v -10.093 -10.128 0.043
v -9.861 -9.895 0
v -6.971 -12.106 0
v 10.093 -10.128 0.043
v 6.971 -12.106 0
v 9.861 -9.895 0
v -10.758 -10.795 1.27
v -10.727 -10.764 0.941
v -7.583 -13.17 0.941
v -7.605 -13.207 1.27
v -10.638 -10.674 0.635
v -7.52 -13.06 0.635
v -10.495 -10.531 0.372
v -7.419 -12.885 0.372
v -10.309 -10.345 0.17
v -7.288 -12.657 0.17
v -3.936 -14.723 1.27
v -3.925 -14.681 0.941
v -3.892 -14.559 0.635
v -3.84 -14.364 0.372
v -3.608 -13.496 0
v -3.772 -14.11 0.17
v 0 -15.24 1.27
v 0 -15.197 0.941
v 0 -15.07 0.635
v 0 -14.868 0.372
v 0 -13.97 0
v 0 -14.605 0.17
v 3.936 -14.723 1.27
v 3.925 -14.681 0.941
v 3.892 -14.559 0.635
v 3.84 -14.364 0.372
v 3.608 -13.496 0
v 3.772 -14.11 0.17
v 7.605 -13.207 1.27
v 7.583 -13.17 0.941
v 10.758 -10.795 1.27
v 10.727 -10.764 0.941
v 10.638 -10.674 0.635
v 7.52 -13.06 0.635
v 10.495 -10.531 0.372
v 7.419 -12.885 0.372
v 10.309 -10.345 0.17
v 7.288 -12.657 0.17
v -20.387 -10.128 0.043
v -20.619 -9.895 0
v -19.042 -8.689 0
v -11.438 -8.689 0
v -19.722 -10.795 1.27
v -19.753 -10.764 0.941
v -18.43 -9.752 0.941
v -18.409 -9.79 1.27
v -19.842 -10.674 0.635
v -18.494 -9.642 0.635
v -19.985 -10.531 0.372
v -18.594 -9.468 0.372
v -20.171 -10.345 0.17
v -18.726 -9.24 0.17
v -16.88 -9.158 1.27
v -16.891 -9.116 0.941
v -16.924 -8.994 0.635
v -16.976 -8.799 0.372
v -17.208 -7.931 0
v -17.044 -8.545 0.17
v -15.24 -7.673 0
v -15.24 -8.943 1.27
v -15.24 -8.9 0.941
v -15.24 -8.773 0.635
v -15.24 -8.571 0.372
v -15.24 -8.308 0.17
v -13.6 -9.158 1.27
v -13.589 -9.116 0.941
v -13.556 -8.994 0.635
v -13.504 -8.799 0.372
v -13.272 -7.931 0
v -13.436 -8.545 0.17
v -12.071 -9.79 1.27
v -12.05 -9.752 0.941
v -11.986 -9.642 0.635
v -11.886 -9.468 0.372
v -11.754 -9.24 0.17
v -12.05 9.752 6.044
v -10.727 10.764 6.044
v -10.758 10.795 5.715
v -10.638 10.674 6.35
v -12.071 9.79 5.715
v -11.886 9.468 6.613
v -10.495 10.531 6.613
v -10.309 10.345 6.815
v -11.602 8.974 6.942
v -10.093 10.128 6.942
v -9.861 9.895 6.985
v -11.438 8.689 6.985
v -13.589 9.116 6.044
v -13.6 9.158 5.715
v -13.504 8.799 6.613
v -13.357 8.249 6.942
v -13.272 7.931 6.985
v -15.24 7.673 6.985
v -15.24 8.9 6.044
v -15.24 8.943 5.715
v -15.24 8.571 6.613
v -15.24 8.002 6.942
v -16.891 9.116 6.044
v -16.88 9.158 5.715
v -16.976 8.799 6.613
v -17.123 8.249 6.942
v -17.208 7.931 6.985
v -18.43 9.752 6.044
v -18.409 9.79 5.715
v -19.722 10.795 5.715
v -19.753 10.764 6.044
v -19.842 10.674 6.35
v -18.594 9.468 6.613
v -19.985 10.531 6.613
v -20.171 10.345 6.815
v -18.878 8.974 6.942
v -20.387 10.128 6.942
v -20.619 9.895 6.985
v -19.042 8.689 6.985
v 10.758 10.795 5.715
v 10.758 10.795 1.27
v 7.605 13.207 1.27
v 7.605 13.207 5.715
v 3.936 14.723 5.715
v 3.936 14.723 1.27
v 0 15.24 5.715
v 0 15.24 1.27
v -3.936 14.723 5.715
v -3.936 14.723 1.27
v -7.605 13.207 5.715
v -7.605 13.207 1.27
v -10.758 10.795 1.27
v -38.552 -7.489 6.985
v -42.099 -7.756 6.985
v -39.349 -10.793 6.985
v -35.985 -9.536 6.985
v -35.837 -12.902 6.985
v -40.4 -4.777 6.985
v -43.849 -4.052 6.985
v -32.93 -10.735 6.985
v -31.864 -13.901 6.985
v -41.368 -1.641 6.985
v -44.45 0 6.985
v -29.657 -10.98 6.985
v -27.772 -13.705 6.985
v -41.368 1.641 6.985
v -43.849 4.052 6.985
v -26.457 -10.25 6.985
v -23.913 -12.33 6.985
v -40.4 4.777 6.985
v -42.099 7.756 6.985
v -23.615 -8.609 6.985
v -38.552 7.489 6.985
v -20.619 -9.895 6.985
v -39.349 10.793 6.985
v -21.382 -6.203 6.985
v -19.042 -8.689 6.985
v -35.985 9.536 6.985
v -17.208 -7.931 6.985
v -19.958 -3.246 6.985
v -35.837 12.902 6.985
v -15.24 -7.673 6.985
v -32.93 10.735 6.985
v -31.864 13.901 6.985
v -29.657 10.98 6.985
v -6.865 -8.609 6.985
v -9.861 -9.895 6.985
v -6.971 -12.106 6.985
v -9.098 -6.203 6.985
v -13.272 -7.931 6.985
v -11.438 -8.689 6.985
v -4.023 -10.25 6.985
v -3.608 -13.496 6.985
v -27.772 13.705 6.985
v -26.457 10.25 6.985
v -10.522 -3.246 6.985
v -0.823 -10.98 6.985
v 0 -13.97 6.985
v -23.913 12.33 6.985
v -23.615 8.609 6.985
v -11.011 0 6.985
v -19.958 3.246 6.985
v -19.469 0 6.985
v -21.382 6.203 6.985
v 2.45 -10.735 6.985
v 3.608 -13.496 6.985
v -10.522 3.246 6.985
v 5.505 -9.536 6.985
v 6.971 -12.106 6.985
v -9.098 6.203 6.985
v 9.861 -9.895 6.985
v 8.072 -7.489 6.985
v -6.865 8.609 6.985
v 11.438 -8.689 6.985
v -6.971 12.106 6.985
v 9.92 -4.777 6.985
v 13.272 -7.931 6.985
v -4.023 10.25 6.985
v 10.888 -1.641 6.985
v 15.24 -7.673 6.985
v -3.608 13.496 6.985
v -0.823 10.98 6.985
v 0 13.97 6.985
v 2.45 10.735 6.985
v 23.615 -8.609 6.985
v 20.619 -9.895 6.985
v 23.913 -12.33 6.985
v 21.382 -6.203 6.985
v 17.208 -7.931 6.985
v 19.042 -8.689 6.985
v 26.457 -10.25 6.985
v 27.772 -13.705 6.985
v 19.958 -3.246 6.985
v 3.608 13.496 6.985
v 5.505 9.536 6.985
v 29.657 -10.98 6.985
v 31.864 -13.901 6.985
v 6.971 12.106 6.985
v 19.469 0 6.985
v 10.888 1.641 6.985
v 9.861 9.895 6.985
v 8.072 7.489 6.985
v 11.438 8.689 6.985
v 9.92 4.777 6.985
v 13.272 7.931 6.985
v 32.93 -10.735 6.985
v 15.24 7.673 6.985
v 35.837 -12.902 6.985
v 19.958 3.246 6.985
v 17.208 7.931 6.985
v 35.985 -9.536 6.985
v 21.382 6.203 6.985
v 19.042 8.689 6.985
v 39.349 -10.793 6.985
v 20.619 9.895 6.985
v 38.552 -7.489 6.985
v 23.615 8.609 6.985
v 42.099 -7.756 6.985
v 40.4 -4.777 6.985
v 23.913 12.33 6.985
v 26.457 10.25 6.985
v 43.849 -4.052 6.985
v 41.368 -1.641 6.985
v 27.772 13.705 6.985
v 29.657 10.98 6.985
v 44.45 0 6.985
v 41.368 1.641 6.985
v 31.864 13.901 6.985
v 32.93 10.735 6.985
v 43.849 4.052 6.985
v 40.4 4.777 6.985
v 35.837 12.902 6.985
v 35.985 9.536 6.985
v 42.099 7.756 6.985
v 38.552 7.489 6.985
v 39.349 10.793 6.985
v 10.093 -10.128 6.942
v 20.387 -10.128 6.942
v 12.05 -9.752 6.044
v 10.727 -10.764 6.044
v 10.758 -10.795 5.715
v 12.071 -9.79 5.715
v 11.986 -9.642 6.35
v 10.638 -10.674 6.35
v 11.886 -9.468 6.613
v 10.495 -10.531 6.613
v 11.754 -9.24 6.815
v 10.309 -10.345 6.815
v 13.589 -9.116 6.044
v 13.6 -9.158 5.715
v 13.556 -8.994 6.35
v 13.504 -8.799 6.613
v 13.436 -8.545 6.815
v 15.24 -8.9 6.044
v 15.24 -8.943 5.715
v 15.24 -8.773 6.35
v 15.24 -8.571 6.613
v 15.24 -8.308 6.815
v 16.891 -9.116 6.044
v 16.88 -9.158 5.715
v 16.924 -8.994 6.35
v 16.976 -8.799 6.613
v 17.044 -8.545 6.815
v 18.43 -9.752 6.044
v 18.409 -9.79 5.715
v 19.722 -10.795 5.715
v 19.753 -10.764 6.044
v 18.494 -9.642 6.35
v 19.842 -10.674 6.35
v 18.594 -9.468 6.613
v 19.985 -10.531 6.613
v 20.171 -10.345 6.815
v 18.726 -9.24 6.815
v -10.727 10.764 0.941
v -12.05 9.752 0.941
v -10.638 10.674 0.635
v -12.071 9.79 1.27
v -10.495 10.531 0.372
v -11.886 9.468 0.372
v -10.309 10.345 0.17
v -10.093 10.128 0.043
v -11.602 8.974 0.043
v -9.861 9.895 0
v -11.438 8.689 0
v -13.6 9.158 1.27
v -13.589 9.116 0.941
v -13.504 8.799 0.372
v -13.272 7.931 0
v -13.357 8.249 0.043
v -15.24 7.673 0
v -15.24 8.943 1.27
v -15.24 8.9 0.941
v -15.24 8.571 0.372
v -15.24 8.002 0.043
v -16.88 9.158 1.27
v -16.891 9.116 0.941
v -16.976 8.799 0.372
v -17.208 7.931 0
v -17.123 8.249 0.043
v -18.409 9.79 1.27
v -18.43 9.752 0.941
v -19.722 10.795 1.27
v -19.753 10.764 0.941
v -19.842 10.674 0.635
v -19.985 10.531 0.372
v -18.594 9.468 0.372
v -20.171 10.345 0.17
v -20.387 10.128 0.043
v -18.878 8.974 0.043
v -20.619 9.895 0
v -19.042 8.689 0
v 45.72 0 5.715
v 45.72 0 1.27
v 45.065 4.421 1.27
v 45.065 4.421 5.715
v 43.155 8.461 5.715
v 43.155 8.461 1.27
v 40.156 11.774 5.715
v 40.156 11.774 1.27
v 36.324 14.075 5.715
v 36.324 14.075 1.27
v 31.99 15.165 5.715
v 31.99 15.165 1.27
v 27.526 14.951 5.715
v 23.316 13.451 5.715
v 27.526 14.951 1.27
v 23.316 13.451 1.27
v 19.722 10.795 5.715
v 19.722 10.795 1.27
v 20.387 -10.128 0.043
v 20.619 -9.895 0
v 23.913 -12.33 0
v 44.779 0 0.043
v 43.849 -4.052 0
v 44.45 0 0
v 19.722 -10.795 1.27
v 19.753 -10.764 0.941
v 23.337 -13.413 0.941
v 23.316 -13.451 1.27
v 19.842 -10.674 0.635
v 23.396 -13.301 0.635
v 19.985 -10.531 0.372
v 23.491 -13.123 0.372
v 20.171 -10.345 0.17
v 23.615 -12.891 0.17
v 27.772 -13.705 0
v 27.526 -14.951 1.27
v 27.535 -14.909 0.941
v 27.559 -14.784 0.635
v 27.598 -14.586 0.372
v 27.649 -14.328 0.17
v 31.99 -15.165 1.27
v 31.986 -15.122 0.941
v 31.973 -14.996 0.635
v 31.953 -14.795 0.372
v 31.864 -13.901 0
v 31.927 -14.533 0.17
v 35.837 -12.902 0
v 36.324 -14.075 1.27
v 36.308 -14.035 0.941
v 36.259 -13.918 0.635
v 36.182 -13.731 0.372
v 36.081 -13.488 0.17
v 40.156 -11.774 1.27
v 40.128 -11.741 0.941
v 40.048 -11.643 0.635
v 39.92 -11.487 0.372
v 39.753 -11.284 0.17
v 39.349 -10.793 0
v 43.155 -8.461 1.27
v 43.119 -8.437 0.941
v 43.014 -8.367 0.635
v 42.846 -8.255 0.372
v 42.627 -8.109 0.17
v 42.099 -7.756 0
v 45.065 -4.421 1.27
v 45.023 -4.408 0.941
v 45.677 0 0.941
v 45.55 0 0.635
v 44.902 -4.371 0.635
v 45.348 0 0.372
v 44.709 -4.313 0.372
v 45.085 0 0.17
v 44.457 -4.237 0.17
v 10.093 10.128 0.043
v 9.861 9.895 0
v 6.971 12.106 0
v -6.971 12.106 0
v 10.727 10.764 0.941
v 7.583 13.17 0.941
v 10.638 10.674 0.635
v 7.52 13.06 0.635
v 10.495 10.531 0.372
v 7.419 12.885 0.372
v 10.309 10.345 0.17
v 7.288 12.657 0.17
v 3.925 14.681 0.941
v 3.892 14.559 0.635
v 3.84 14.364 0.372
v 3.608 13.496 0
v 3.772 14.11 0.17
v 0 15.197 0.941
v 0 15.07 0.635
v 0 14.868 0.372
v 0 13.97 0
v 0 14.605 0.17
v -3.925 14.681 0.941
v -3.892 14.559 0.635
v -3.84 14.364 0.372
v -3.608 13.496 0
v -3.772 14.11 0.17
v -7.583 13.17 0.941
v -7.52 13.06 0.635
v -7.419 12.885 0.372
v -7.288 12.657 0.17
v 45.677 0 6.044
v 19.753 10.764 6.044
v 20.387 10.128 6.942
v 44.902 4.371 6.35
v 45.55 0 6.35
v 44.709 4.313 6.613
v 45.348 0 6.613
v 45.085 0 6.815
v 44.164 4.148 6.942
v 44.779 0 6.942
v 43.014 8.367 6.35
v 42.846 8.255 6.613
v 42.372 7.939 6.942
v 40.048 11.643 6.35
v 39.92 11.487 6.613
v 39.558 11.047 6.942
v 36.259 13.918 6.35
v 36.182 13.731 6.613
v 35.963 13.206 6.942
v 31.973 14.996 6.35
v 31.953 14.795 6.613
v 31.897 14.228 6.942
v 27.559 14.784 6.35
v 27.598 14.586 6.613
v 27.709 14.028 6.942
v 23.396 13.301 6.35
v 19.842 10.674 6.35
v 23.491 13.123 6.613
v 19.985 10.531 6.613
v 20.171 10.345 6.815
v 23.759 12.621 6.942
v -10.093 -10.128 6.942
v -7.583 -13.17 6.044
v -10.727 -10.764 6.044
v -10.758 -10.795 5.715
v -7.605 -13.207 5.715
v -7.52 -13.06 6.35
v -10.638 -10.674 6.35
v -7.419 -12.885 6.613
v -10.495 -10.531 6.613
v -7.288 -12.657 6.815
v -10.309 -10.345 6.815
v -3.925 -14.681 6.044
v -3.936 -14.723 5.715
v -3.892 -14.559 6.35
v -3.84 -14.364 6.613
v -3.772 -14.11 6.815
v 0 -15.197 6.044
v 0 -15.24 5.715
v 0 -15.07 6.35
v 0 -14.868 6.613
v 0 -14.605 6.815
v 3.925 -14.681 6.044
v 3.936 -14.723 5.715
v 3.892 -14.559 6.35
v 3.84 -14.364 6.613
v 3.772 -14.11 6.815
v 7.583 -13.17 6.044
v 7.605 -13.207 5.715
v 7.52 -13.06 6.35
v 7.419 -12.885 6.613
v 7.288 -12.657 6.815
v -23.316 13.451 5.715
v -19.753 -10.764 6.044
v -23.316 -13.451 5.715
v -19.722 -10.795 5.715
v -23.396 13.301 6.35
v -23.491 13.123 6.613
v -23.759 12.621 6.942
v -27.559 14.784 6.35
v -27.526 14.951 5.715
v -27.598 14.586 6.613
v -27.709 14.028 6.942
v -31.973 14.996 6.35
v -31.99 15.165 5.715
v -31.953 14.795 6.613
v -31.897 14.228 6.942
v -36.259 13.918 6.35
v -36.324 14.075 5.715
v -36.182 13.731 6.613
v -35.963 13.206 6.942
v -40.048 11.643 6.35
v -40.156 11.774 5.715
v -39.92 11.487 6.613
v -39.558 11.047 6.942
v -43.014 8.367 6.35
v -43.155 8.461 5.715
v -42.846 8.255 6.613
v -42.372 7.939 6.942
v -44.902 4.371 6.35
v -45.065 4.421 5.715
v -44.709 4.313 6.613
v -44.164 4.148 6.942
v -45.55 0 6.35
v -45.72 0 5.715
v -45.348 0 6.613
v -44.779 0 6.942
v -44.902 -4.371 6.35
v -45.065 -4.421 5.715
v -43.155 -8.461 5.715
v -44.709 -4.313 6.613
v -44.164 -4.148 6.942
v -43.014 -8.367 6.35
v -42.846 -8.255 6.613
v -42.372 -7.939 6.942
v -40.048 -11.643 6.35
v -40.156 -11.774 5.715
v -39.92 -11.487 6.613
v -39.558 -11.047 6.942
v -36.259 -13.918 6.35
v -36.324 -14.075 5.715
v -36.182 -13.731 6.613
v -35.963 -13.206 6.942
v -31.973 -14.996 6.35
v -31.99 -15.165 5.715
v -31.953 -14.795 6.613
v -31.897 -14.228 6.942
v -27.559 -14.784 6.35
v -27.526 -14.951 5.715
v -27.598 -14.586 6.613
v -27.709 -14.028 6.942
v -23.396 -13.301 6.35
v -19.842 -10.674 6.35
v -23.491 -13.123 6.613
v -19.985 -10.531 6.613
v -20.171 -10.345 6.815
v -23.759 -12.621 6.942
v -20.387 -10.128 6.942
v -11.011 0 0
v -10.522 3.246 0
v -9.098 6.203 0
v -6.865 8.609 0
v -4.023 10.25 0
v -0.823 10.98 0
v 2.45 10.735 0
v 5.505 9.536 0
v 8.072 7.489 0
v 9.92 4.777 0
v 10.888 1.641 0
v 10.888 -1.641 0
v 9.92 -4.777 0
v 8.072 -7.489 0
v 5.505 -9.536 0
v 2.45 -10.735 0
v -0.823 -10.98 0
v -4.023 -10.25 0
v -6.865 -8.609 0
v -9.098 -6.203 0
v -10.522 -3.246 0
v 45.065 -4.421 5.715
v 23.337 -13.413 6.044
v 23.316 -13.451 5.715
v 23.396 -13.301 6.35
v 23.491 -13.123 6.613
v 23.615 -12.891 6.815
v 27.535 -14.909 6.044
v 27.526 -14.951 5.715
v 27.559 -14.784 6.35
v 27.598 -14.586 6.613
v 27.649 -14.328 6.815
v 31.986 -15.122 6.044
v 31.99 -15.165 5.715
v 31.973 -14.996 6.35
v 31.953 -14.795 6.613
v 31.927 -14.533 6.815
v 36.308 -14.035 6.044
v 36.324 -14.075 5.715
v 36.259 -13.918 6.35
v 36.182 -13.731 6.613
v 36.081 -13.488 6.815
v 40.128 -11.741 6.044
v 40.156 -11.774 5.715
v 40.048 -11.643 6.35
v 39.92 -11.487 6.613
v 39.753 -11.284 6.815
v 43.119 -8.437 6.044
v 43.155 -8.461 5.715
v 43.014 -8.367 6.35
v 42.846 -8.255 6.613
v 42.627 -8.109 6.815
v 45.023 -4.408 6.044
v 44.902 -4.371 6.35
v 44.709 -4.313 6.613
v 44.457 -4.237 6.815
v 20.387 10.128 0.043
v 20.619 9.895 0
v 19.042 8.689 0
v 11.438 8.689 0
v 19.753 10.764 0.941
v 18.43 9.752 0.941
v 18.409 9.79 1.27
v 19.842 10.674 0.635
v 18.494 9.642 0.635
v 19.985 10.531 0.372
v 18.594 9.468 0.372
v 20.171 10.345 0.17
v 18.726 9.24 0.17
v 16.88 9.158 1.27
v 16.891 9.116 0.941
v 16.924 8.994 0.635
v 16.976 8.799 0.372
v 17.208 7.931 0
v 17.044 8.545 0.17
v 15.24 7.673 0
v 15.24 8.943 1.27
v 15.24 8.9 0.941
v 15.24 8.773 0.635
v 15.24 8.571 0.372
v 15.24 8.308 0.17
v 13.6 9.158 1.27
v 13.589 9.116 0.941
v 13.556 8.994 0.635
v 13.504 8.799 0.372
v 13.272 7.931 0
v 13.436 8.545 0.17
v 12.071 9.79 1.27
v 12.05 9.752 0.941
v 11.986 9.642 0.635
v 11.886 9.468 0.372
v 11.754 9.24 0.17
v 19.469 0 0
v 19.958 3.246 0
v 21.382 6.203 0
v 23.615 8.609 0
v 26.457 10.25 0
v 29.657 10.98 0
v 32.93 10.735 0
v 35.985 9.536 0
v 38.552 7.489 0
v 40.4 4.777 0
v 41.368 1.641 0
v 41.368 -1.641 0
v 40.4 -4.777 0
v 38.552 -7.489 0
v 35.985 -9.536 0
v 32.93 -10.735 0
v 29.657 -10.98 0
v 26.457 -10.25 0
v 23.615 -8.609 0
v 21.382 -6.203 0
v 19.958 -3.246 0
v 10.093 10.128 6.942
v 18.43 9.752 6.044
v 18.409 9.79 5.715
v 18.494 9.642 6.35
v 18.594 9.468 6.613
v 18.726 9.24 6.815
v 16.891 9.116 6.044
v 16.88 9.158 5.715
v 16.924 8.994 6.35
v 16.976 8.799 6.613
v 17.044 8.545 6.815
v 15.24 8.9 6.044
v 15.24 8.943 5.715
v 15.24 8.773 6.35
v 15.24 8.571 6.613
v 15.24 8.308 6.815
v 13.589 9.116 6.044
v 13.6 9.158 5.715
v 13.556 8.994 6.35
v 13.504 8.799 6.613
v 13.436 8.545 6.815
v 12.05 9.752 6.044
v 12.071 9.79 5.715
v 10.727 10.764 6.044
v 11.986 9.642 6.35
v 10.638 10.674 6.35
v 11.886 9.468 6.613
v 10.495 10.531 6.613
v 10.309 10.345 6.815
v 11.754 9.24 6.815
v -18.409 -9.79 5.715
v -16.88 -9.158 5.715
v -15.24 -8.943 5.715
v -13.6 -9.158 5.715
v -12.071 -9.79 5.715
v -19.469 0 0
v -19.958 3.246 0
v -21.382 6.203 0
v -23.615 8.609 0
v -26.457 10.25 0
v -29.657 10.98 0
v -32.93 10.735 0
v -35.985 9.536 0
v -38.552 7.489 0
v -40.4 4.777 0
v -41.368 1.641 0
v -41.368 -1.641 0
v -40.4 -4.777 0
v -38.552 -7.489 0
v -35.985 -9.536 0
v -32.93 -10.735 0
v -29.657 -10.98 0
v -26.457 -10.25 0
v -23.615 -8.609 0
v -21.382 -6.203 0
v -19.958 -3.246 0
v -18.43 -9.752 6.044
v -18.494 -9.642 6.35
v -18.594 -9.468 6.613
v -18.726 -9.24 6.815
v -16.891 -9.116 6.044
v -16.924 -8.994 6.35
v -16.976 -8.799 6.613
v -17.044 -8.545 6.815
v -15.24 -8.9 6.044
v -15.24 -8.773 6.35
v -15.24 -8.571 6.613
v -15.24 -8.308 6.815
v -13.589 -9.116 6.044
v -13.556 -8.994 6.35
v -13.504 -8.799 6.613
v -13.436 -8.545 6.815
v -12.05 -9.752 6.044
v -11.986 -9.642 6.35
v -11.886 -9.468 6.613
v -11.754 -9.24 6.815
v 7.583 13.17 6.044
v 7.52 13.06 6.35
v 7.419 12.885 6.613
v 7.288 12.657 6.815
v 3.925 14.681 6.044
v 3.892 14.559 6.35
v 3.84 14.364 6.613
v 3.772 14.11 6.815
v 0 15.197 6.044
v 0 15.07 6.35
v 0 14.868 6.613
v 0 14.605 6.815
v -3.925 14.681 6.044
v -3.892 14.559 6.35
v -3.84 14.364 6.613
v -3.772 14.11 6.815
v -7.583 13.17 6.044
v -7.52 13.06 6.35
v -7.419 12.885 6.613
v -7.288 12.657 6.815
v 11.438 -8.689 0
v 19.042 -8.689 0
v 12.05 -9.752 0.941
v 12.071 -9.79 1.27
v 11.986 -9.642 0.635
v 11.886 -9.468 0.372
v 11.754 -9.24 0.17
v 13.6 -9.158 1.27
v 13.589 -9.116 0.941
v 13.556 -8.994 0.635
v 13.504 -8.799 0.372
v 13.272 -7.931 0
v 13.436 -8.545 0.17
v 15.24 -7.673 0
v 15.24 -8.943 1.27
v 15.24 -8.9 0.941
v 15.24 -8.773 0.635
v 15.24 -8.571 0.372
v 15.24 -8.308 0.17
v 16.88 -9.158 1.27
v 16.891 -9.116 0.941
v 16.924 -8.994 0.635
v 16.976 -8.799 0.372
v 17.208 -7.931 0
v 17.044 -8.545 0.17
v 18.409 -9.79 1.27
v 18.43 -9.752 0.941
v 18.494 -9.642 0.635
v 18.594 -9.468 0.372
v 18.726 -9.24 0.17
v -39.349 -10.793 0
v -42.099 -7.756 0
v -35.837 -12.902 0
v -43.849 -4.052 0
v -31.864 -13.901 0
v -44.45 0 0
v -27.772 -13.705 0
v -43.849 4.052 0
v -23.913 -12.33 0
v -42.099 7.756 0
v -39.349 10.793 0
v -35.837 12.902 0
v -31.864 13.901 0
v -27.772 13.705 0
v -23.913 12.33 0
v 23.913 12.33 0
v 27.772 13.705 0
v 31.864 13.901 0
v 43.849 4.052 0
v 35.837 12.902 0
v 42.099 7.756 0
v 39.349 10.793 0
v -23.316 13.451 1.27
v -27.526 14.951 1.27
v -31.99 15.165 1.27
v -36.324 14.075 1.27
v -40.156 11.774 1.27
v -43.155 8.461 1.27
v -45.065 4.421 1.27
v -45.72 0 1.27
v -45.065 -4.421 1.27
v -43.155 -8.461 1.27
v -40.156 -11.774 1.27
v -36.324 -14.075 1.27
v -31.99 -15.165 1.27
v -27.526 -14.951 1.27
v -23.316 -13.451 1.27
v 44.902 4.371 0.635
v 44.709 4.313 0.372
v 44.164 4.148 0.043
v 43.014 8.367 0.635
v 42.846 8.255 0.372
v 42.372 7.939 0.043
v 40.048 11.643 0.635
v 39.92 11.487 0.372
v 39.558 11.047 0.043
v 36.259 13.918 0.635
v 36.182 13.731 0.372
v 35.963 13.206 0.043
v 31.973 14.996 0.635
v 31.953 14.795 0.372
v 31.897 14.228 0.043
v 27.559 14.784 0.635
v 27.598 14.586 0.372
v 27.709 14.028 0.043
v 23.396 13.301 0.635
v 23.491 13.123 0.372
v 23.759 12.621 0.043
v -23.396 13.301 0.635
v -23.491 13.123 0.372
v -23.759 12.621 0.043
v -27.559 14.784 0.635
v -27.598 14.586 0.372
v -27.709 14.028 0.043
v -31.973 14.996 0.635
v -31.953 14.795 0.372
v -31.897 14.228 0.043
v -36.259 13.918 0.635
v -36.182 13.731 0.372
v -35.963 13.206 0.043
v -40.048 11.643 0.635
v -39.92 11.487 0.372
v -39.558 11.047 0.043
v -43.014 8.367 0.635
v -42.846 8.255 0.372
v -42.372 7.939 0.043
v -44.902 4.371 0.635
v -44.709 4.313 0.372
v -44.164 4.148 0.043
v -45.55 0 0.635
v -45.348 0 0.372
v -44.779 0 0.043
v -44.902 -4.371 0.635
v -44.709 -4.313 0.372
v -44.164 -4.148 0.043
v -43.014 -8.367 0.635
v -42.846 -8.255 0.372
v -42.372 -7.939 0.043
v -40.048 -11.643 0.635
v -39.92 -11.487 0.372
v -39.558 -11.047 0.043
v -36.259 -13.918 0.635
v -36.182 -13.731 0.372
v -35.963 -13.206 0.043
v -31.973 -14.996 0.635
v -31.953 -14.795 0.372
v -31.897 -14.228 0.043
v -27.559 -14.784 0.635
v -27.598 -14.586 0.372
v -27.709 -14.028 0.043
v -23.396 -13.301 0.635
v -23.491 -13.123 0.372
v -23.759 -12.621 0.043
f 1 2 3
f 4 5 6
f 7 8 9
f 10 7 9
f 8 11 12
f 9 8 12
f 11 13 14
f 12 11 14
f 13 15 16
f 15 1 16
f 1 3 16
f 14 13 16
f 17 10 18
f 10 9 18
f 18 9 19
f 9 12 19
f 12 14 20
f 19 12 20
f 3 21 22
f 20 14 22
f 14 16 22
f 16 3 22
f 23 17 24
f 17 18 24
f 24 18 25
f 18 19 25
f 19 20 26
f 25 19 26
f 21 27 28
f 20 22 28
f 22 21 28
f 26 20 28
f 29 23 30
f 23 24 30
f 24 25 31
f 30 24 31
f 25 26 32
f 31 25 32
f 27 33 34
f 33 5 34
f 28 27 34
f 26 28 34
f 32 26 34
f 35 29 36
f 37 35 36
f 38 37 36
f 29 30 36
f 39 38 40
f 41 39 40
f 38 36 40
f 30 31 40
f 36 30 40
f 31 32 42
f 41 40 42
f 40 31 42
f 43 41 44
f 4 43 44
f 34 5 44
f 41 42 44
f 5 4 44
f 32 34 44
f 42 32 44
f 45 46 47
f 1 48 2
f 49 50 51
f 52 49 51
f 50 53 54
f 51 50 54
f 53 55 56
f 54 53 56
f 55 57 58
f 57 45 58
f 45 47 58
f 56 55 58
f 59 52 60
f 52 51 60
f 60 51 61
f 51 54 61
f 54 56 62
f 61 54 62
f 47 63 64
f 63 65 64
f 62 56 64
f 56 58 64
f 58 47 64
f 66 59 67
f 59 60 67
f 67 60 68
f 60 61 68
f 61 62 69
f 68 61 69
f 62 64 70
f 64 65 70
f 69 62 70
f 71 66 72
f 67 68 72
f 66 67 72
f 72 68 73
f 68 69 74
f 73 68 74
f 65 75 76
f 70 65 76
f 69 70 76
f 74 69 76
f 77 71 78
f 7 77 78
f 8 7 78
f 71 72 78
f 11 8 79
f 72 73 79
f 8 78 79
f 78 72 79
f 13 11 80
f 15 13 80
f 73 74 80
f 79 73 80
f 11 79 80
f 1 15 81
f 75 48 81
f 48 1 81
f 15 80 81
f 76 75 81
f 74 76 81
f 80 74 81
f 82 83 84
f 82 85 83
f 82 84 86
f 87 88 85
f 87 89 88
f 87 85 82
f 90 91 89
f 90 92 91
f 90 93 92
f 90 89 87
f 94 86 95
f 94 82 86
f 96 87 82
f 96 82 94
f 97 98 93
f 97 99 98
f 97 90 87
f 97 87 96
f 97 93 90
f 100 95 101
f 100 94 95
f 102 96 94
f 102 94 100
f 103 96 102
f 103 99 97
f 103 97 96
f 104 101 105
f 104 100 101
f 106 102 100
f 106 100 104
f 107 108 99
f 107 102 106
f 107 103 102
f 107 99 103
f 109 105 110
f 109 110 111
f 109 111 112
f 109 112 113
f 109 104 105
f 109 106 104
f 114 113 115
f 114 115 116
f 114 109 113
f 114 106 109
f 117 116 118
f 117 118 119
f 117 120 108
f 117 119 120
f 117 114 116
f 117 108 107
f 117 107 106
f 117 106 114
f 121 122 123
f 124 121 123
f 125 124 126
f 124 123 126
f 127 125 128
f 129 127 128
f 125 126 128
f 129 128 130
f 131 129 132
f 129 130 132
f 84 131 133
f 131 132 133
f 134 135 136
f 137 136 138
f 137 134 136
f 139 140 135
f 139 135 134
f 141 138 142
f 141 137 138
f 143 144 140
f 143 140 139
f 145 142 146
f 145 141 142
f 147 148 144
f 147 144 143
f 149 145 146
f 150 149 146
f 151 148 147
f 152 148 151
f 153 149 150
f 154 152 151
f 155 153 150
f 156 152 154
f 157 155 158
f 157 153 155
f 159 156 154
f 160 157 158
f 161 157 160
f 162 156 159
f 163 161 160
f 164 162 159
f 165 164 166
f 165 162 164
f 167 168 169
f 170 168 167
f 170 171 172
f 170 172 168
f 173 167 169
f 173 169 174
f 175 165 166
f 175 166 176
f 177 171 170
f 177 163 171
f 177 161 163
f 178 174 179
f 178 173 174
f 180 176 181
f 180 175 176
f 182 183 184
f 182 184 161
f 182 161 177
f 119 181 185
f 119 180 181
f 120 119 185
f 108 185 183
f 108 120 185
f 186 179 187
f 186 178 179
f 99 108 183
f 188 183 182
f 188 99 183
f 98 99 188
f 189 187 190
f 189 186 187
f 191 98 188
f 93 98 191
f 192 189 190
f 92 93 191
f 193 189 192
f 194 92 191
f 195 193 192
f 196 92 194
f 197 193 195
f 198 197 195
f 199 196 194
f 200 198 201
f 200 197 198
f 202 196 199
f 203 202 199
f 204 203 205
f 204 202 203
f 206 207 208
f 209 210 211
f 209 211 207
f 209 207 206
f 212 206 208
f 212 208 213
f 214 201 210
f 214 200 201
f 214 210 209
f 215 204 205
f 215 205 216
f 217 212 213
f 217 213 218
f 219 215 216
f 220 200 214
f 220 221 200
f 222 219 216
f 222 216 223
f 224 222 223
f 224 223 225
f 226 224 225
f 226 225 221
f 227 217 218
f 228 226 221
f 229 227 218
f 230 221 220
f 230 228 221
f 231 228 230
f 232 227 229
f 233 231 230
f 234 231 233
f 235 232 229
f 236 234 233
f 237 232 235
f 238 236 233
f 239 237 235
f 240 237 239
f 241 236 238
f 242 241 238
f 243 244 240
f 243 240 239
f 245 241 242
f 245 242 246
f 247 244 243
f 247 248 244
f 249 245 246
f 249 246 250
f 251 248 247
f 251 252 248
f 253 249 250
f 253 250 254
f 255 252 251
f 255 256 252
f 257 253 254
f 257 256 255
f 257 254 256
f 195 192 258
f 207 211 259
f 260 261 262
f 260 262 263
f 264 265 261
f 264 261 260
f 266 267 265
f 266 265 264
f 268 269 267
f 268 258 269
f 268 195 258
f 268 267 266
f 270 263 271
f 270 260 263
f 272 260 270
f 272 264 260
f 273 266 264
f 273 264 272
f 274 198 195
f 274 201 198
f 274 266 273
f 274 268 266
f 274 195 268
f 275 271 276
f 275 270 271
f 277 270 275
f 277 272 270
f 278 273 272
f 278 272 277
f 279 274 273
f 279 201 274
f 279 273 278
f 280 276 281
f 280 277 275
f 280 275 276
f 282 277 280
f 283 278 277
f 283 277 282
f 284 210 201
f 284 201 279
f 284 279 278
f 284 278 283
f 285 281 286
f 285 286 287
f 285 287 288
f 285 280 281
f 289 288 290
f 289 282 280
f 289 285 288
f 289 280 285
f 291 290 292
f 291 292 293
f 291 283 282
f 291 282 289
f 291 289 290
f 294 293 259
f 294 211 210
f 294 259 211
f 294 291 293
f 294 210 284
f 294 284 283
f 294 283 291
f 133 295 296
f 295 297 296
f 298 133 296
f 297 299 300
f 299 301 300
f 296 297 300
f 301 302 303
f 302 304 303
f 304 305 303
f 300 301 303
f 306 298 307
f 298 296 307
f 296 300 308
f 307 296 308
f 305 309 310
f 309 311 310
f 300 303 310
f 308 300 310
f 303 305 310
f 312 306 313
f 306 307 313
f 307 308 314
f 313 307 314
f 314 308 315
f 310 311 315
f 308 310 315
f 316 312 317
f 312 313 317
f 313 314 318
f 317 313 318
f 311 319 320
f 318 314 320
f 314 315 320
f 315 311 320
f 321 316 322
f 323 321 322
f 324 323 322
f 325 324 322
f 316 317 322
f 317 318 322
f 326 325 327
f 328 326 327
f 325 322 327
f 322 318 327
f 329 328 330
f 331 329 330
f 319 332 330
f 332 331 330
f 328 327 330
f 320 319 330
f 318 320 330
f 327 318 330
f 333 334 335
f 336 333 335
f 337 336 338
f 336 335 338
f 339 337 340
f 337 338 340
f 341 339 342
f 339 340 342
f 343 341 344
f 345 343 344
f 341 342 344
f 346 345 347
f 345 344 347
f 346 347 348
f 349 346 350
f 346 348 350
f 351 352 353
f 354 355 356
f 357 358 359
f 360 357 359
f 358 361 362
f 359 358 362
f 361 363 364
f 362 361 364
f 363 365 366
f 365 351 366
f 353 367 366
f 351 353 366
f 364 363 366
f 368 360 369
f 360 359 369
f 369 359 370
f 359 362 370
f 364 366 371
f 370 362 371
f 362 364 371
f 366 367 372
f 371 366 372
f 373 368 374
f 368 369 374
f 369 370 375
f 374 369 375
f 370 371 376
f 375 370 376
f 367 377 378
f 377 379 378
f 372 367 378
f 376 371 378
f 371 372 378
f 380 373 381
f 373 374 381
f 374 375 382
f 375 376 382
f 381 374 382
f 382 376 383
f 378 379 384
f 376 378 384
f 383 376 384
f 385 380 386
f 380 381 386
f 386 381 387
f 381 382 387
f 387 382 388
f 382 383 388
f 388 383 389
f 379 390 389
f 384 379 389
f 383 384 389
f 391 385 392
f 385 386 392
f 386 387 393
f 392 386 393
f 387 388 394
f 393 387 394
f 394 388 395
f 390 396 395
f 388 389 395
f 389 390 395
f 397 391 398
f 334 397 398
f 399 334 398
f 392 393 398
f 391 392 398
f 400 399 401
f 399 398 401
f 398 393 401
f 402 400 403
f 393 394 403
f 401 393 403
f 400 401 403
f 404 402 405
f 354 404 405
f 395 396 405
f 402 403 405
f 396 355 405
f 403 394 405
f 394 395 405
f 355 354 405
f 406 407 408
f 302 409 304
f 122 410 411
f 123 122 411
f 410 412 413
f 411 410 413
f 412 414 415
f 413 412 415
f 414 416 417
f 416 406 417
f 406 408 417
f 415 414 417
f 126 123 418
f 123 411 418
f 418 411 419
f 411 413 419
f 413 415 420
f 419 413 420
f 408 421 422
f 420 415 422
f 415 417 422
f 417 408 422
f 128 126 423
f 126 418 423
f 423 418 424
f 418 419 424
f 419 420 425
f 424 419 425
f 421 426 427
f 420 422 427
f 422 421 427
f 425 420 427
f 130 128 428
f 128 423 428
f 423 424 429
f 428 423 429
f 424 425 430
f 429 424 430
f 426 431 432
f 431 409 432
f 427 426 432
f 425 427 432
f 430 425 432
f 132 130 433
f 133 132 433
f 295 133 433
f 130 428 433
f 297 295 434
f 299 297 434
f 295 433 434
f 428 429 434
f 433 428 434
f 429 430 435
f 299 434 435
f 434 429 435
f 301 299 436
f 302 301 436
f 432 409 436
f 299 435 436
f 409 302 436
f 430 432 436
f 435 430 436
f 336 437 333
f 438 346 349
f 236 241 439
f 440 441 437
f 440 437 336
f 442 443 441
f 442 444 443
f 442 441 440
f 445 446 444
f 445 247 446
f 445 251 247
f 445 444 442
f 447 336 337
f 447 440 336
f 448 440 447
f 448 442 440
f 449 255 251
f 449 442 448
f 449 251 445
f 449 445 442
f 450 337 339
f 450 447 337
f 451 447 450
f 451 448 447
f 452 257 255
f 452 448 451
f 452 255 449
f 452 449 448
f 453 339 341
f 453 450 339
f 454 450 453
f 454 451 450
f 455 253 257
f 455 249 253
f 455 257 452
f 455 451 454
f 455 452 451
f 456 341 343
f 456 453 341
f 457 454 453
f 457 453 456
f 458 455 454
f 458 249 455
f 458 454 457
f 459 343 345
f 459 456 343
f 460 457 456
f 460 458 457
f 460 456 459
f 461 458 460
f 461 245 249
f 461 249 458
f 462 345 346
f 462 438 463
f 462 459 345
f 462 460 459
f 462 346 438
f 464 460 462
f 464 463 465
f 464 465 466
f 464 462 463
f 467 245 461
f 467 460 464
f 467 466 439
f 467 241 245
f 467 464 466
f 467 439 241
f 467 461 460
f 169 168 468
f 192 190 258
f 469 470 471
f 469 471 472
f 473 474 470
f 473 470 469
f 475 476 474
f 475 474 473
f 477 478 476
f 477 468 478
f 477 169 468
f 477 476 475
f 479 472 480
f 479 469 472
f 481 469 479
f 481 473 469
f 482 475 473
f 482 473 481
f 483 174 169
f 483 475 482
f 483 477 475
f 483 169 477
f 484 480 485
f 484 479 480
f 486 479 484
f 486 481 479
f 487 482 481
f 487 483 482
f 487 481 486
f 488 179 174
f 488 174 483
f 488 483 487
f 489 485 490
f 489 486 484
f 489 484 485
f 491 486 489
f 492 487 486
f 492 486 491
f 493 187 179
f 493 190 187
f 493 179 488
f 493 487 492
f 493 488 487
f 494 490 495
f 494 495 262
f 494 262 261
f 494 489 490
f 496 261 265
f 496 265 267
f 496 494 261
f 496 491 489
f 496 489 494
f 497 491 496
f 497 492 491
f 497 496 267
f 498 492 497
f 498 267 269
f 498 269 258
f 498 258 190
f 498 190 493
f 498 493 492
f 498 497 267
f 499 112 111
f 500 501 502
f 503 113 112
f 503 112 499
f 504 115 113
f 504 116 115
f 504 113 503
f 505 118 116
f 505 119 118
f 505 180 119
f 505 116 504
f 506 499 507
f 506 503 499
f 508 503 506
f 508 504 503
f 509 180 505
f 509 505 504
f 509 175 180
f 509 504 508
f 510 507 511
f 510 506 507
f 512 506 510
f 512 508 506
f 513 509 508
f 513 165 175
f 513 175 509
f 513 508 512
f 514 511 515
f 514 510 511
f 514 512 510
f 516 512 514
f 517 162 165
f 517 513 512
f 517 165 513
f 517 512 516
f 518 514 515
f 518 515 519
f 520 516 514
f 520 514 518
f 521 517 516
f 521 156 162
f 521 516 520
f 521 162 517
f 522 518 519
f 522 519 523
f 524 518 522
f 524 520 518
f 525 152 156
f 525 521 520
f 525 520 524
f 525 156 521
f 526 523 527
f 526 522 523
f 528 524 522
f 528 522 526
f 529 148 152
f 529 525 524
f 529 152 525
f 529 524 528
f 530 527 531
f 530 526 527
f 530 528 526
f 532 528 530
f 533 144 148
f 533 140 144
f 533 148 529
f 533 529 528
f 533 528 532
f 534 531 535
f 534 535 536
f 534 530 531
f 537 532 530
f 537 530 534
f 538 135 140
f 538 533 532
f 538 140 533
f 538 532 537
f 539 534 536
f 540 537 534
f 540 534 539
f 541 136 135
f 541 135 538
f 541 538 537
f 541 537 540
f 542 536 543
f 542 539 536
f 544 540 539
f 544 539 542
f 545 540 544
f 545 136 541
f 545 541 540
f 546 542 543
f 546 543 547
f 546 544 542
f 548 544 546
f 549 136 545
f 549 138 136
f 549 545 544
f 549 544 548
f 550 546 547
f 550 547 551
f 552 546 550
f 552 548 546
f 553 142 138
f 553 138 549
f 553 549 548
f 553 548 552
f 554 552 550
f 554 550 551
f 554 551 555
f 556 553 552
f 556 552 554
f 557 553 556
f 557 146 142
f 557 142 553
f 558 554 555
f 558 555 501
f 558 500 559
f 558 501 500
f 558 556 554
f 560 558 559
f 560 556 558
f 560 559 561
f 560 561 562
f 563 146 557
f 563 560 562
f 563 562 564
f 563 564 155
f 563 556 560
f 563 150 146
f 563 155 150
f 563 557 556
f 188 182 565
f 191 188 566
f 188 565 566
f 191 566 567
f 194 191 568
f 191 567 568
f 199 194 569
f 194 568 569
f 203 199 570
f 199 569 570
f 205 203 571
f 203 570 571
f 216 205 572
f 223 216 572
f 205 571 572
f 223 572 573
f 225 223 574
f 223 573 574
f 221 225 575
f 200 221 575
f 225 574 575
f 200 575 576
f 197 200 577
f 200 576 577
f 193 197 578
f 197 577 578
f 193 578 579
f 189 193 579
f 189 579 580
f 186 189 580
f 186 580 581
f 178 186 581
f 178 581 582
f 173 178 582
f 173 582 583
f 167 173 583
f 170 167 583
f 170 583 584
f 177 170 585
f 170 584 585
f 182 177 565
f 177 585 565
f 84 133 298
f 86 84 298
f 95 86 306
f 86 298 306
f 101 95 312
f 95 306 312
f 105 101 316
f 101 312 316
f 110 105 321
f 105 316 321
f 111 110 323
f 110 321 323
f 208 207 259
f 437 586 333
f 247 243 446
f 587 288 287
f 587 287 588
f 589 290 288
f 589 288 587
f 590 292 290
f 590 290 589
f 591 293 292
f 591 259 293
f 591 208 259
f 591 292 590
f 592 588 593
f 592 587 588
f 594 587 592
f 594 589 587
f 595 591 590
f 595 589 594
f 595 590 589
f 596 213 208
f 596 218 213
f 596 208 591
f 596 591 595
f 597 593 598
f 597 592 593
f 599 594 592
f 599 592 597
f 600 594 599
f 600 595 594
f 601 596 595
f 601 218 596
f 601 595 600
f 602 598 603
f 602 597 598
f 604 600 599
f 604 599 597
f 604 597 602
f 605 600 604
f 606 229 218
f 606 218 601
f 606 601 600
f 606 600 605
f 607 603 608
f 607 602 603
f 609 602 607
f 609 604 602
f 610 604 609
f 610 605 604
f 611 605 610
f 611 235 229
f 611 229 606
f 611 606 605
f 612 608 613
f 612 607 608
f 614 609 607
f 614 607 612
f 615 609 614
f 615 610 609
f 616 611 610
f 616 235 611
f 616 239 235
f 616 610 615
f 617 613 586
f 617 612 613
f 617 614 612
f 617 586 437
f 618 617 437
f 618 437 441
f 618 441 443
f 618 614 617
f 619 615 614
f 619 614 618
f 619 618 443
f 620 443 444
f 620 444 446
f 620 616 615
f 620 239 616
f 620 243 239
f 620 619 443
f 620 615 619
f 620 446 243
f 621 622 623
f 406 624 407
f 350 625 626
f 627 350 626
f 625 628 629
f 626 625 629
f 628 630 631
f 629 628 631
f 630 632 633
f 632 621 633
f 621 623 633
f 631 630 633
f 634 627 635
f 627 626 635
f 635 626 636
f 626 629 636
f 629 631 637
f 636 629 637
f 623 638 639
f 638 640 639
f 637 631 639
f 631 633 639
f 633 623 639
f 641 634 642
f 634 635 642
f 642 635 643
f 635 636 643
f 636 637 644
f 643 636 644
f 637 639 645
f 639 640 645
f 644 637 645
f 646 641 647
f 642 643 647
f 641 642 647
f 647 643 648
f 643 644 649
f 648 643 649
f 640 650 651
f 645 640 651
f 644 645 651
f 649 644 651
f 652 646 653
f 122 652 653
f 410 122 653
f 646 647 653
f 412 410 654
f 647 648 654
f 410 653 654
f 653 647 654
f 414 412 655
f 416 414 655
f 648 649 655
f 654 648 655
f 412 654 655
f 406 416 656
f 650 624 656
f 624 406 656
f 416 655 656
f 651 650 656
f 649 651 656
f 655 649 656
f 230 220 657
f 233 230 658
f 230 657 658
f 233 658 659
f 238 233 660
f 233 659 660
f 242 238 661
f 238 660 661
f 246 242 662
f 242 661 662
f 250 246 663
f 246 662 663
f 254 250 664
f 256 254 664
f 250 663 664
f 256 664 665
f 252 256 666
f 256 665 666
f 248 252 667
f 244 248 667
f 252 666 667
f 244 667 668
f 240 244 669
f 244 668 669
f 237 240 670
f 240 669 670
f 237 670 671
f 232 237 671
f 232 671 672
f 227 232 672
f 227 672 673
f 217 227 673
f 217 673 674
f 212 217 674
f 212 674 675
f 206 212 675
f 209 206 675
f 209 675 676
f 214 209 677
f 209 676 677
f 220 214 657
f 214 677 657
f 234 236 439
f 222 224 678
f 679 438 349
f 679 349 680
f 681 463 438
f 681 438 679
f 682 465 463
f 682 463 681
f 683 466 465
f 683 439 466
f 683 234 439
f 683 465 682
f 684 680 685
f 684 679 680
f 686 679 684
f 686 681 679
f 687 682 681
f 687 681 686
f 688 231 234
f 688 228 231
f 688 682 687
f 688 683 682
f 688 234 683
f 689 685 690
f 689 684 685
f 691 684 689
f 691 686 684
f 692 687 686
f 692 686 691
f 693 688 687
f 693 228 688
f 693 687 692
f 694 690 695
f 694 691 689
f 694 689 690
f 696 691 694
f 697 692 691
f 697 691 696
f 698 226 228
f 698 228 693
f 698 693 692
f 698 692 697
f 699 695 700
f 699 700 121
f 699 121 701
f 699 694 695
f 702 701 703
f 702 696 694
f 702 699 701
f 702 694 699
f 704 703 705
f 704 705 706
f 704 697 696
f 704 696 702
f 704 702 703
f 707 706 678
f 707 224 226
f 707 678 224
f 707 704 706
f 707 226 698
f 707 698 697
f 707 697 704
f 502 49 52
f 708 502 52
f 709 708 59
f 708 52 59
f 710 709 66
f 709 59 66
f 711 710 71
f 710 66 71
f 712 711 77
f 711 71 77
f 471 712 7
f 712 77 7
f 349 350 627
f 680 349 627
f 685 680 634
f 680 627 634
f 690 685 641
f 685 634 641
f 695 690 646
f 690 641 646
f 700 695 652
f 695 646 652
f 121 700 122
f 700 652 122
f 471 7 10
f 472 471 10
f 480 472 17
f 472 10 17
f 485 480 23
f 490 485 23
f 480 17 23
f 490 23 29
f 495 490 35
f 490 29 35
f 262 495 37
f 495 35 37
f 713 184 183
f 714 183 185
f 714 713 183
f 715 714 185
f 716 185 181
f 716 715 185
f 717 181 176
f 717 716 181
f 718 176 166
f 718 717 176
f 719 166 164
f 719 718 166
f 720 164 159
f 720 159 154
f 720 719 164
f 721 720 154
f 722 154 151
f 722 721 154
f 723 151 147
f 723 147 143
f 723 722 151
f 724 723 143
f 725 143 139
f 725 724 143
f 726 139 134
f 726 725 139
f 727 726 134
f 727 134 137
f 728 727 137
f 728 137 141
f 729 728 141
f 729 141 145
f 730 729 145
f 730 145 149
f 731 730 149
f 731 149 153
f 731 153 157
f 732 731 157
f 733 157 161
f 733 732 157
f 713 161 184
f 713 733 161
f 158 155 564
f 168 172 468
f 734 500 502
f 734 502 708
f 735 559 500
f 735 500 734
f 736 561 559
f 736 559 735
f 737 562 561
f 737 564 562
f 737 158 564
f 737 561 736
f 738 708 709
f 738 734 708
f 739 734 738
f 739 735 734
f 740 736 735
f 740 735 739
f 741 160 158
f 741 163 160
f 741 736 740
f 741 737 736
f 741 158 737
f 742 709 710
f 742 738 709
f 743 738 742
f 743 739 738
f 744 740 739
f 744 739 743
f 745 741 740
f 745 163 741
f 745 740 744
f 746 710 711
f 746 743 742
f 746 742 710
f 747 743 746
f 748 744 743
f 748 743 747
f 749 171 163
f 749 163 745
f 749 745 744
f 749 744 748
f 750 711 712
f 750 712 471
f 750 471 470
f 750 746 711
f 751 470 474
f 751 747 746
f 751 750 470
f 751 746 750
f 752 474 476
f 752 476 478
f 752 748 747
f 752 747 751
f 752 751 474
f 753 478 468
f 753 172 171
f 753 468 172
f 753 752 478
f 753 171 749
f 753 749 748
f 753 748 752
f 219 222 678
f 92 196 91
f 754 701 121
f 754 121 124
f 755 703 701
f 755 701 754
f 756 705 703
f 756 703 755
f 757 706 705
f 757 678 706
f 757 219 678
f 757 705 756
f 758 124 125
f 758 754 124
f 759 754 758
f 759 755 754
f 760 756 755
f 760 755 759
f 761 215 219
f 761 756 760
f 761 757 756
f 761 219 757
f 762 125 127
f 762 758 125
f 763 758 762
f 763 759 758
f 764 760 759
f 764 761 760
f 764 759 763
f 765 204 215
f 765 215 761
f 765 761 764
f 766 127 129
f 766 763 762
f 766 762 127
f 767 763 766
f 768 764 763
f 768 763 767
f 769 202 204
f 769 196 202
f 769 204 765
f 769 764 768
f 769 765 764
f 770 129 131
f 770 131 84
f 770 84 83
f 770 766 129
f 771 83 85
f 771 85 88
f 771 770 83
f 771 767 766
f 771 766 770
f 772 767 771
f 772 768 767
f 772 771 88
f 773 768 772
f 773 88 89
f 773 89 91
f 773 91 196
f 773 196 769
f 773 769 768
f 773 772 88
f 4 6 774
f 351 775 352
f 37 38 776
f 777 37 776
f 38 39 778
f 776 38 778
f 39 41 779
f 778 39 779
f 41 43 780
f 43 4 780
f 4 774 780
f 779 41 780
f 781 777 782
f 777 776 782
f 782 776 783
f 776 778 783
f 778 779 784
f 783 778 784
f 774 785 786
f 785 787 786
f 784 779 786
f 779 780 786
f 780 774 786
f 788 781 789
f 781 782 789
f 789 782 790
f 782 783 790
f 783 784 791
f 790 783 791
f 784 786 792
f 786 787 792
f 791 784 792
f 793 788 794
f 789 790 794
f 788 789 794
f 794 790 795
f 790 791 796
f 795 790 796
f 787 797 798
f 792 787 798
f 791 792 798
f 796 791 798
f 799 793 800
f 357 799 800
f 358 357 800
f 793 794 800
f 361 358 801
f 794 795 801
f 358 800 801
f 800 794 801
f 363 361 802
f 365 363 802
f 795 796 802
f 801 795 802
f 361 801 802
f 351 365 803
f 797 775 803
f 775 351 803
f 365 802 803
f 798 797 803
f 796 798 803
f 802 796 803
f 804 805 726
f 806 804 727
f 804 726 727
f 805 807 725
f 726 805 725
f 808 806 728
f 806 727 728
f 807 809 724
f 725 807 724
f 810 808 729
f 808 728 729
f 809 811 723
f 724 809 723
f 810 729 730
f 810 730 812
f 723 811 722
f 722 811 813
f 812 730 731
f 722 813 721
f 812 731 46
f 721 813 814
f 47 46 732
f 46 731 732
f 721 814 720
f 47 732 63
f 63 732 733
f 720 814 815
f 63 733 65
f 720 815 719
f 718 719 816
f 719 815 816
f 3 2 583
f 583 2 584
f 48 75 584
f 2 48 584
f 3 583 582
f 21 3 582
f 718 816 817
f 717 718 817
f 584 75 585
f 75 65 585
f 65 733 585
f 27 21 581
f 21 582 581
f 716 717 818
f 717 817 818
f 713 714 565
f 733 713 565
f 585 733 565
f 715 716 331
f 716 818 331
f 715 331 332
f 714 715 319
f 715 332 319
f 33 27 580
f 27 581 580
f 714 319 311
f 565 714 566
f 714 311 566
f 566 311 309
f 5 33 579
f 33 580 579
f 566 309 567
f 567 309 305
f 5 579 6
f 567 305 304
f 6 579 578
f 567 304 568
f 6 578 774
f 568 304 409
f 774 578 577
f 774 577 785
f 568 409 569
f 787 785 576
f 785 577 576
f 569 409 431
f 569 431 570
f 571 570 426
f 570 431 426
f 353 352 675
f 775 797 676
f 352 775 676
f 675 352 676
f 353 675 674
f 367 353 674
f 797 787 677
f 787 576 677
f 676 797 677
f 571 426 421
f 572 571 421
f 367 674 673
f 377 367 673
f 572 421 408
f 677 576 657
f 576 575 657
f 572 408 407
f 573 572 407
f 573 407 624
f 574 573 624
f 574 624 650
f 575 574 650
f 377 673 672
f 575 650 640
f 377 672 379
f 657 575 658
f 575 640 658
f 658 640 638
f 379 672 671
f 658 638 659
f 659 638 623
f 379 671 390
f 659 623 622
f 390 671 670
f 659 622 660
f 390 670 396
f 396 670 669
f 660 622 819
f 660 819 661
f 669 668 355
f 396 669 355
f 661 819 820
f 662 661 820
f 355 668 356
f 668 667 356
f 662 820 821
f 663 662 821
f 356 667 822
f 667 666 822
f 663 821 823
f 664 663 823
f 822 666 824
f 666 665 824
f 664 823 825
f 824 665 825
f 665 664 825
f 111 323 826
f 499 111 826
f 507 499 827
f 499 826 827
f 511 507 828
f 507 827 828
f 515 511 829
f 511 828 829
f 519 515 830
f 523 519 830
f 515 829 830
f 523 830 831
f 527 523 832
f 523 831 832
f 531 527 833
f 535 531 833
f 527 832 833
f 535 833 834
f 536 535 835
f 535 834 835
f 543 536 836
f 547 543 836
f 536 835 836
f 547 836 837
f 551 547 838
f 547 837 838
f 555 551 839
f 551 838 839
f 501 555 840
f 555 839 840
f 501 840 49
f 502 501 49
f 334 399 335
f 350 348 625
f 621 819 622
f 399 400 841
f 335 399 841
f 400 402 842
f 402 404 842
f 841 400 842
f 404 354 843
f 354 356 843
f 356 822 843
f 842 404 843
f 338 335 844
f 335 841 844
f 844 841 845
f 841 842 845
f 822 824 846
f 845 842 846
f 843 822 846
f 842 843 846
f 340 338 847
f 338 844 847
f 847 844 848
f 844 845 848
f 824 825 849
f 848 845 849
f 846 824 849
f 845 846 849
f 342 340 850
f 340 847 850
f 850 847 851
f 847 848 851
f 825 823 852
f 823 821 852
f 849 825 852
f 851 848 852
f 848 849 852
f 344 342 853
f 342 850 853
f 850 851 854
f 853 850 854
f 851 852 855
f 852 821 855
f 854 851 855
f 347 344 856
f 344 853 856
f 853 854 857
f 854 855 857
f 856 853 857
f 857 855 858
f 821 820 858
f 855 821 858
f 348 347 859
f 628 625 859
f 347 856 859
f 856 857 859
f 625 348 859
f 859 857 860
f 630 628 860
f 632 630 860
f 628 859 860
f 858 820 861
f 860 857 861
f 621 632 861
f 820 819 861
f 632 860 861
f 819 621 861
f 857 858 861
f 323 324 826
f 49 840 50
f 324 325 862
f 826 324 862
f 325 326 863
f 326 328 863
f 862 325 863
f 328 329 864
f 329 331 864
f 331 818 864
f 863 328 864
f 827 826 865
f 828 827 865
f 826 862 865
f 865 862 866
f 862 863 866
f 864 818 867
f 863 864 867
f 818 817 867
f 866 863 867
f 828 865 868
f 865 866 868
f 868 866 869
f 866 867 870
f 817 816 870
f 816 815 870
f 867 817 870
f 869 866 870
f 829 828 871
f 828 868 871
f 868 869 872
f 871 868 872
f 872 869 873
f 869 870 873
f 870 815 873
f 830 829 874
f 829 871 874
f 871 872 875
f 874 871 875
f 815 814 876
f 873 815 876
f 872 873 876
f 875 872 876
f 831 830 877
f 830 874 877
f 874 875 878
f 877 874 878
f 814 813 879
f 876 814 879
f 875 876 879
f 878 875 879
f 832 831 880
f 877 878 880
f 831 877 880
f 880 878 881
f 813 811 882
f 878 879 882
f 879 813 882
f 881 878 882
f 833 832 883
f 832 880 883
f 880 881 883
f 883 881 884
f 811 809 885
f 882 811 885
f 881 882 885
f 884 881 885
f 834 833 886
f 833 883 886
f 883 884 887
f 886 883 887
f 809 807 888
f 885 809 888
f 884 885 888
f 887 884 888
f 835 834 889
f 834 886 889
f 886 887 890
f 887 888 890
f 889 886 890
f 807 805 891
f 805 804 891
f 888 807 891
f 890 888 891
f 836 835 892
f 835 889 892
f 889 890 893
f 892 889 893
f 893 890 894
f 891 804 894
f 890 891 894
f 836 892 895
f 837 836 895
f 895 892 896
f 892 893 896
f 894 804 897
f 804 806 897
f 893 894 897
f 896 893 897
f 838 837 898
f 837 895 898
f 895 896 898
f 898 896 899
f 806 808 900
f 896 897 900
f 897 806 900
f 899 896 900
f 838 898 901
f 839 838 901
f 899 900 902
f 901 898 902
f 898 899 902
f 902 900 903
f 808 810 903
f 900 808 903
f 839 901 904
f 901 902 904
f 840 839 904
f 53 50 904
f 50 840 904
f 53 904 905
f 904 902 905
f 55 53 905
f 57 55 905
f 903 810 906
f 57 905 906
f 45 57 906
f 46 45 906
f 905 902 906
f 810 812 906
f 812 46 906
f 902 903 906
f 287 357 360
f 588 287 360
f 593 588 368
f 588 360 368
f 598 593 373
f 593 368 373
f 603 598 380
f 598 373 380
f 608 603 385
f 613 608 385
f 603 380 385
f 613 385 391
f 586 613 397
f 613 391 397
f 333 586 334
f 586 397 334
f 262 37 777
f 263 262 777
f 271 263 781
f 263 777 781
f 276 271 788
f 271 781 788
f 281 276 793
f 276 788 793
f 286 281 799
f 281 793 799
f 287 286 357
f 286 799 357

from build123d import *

# Parameters (mm, degrees)
F0_R     = 11.0109
F1_DEPTH = 6.985
F2_R     = 1.27


with BuildPart() as f1:
    # F0 (on Top) → F1 (new body)
    with BuildSketch(Plane.XY):
        with BuildLine():
            Line((15.24, 0), (11.0109, 0))
            ThreePointArc((11.0109, 0), (0, -11.0109), (-11.0109, 0))
            Line((-11.0109, 0), (-15.24, 0))
            ThreePointArc((-15.24, 0), (-14.0748737326, -5.844273215), (-10.7576470588, -10.7949353753))
            ThreePointArc((-10.7576470588, -10.7949353753), (0, -15.24), (10.7576470588, -10.7949353753))
            ThreePointArc((10.7576470588, -10.7949353753), (14.0748737326, -5.844273215), (15.24, 0))
        make_face()
        with BuildLine():
            ThreePointArc((-11.0109, 0), (0, 11.0109), (11.0109, 0))
            Line((11.0109, 0), (15.24, 0))
            ThreePointArc((15.24, 0), (14.0748737326, 5.844273215), (10.7576470588, 10.7949353753))
            ThreePointArc((10.7576470588, 10.7949353753), (0, 15.24), (-10.7576470588, 10.7949353753))
            ThreePointArc((-10.7576470588, 10.7949353753), (-14.0748737326, 5.844273215), (-15.24, 0))
            Line((-15.24, 0), (-11.0109, 0))
        make_face()
        with BuildLine():
            ThreePointArc((19.7223529412, -10.7949353753), (16.4051262674, -5.844273215), (15.24, 0))
            ThreePointArc((15.24, 0), (14.0748737326, -5.844273215), (10.7576470588, -10.7949353753))
            ThreePointArc((10.7576470588, -10.7949353753), (15.24, -8.9428251151), (19.7223529412, -10.7949353753))
        make_face()
        with BuildLine():
            ThreePointArc((10.7576470588, 10.7949353753), (14.0748737326, 5.844273215), (15.24, 0))
            ThreePointArc((15.24, 0), (16.4051262674, 5.844273215), (19.7223529412, 10.7949353753))
            ThreePointArc((19.7223529412, 10.7949353753), (15.24, 8.9428251151), (10.7576470588, 10.7949353753))
        make_face()
        with BuildLine():
            ThreePointArc((19.7223529412, 10.7949353753), (16.4051262674, 5.844273215), (15.24, 0))
            ThreePointArc((15.24, 0), (16.4051262674, -5.844273215), (19.7223529412, -10.7949353753))
            ThreePointArc((19.7223529412, -10.7949353753), (36.324273215, -14.0748737326), (45.72, 0))
            ThreePointArc((45.72, 0), (36.324273215, 14.0748737326), (19.7223529412, 10.7949353753))
        make_face()
        with BuildLine():
            ThreePointArc((41.4909, 0), (30.48, -11.0109), (19.4691, 0))
            ThreePointArc((19.4691, 0), (30.48, 11.0109), (41.4909, 0))
        make_face(mode=Mode.SUBTRACT)
        with BuildLine():
            ThreePointArc((-19.7223529412, -10.7949353753), (-16.4051262674, -5.844273215), (-15.24, 0))
            ThreePointArc((-15.24, 0), (-16.4051262674, 5.844273215), (-19.7223529412, 10.7949353753))
            ThreePointArc((-19.7223529412, 10.7949353753), (-45.72, 0), (-19.7223529412, -10.7949353753))
        make_face()
        with Locations((-30.48, 0)):
            Circle(F0_R, mode=Mode.SUBTRACT)
        with BuildLine():
            ThreePointArc((-10.7576470588, -10.7949353753), (-14.0748737326, -5.844273215), (-15.24, 0))
            ThreePointArc((-15.24, 0), (-16.4051262674, -5.844273215), (-19.7223529412, -10.7949353753))
            ThreePointArc((-19.7223529412, -10.7949353753), (-15.24, -8.9428251151), (-10.7576470588, -10.7949353753))
        make_face()
        with BuildLine():
            ThreePointArc((-19.7223529412, 10.7949353753), (-16.4051262674, 5.844273215), (-15.24, 0))
            ThreePointArc((-15.24, 0), (-14.0748737326, 5.844273215), (-10.7576470588, 10.7949353753))
            ThreePointArc((-10.7576470588, 10.7949353753), (-15.24, 8.9428251151), (-19.7223529412, 10.7949353753))
        make_face()
    extrude(amount=F1_DEPTH)

    # F2
    f2_edges = [f1.edges().sort_by_distance(p)[0] for p in [
        (-45.72, 0, 6.985),
        (0, 15.24, 6.985),
        (0, -15.24, 6.985),
        (-15.24, -8.942825, 6.985),
        (-15.24, 8.942825, 6.985),
        (15.24, 8.942825, 6.985),
        (45.72, 0, 6.985),
        (15.24, -8.942825, 6.985),
        (-45.72, 0, 0),
        (0, -15.24, 0),
        (45.72, 0, 0),
        (15.24, 8.942825, 0),
        (0, 15.24, 0),
        (-15.24, 8.942825, 0),
        (15.24, -8.942825, 0),
        (-15.24, -8.942825, 0),
    ]]
    fillet(f2_edges, radius=F2_R)


solid = f1.part
